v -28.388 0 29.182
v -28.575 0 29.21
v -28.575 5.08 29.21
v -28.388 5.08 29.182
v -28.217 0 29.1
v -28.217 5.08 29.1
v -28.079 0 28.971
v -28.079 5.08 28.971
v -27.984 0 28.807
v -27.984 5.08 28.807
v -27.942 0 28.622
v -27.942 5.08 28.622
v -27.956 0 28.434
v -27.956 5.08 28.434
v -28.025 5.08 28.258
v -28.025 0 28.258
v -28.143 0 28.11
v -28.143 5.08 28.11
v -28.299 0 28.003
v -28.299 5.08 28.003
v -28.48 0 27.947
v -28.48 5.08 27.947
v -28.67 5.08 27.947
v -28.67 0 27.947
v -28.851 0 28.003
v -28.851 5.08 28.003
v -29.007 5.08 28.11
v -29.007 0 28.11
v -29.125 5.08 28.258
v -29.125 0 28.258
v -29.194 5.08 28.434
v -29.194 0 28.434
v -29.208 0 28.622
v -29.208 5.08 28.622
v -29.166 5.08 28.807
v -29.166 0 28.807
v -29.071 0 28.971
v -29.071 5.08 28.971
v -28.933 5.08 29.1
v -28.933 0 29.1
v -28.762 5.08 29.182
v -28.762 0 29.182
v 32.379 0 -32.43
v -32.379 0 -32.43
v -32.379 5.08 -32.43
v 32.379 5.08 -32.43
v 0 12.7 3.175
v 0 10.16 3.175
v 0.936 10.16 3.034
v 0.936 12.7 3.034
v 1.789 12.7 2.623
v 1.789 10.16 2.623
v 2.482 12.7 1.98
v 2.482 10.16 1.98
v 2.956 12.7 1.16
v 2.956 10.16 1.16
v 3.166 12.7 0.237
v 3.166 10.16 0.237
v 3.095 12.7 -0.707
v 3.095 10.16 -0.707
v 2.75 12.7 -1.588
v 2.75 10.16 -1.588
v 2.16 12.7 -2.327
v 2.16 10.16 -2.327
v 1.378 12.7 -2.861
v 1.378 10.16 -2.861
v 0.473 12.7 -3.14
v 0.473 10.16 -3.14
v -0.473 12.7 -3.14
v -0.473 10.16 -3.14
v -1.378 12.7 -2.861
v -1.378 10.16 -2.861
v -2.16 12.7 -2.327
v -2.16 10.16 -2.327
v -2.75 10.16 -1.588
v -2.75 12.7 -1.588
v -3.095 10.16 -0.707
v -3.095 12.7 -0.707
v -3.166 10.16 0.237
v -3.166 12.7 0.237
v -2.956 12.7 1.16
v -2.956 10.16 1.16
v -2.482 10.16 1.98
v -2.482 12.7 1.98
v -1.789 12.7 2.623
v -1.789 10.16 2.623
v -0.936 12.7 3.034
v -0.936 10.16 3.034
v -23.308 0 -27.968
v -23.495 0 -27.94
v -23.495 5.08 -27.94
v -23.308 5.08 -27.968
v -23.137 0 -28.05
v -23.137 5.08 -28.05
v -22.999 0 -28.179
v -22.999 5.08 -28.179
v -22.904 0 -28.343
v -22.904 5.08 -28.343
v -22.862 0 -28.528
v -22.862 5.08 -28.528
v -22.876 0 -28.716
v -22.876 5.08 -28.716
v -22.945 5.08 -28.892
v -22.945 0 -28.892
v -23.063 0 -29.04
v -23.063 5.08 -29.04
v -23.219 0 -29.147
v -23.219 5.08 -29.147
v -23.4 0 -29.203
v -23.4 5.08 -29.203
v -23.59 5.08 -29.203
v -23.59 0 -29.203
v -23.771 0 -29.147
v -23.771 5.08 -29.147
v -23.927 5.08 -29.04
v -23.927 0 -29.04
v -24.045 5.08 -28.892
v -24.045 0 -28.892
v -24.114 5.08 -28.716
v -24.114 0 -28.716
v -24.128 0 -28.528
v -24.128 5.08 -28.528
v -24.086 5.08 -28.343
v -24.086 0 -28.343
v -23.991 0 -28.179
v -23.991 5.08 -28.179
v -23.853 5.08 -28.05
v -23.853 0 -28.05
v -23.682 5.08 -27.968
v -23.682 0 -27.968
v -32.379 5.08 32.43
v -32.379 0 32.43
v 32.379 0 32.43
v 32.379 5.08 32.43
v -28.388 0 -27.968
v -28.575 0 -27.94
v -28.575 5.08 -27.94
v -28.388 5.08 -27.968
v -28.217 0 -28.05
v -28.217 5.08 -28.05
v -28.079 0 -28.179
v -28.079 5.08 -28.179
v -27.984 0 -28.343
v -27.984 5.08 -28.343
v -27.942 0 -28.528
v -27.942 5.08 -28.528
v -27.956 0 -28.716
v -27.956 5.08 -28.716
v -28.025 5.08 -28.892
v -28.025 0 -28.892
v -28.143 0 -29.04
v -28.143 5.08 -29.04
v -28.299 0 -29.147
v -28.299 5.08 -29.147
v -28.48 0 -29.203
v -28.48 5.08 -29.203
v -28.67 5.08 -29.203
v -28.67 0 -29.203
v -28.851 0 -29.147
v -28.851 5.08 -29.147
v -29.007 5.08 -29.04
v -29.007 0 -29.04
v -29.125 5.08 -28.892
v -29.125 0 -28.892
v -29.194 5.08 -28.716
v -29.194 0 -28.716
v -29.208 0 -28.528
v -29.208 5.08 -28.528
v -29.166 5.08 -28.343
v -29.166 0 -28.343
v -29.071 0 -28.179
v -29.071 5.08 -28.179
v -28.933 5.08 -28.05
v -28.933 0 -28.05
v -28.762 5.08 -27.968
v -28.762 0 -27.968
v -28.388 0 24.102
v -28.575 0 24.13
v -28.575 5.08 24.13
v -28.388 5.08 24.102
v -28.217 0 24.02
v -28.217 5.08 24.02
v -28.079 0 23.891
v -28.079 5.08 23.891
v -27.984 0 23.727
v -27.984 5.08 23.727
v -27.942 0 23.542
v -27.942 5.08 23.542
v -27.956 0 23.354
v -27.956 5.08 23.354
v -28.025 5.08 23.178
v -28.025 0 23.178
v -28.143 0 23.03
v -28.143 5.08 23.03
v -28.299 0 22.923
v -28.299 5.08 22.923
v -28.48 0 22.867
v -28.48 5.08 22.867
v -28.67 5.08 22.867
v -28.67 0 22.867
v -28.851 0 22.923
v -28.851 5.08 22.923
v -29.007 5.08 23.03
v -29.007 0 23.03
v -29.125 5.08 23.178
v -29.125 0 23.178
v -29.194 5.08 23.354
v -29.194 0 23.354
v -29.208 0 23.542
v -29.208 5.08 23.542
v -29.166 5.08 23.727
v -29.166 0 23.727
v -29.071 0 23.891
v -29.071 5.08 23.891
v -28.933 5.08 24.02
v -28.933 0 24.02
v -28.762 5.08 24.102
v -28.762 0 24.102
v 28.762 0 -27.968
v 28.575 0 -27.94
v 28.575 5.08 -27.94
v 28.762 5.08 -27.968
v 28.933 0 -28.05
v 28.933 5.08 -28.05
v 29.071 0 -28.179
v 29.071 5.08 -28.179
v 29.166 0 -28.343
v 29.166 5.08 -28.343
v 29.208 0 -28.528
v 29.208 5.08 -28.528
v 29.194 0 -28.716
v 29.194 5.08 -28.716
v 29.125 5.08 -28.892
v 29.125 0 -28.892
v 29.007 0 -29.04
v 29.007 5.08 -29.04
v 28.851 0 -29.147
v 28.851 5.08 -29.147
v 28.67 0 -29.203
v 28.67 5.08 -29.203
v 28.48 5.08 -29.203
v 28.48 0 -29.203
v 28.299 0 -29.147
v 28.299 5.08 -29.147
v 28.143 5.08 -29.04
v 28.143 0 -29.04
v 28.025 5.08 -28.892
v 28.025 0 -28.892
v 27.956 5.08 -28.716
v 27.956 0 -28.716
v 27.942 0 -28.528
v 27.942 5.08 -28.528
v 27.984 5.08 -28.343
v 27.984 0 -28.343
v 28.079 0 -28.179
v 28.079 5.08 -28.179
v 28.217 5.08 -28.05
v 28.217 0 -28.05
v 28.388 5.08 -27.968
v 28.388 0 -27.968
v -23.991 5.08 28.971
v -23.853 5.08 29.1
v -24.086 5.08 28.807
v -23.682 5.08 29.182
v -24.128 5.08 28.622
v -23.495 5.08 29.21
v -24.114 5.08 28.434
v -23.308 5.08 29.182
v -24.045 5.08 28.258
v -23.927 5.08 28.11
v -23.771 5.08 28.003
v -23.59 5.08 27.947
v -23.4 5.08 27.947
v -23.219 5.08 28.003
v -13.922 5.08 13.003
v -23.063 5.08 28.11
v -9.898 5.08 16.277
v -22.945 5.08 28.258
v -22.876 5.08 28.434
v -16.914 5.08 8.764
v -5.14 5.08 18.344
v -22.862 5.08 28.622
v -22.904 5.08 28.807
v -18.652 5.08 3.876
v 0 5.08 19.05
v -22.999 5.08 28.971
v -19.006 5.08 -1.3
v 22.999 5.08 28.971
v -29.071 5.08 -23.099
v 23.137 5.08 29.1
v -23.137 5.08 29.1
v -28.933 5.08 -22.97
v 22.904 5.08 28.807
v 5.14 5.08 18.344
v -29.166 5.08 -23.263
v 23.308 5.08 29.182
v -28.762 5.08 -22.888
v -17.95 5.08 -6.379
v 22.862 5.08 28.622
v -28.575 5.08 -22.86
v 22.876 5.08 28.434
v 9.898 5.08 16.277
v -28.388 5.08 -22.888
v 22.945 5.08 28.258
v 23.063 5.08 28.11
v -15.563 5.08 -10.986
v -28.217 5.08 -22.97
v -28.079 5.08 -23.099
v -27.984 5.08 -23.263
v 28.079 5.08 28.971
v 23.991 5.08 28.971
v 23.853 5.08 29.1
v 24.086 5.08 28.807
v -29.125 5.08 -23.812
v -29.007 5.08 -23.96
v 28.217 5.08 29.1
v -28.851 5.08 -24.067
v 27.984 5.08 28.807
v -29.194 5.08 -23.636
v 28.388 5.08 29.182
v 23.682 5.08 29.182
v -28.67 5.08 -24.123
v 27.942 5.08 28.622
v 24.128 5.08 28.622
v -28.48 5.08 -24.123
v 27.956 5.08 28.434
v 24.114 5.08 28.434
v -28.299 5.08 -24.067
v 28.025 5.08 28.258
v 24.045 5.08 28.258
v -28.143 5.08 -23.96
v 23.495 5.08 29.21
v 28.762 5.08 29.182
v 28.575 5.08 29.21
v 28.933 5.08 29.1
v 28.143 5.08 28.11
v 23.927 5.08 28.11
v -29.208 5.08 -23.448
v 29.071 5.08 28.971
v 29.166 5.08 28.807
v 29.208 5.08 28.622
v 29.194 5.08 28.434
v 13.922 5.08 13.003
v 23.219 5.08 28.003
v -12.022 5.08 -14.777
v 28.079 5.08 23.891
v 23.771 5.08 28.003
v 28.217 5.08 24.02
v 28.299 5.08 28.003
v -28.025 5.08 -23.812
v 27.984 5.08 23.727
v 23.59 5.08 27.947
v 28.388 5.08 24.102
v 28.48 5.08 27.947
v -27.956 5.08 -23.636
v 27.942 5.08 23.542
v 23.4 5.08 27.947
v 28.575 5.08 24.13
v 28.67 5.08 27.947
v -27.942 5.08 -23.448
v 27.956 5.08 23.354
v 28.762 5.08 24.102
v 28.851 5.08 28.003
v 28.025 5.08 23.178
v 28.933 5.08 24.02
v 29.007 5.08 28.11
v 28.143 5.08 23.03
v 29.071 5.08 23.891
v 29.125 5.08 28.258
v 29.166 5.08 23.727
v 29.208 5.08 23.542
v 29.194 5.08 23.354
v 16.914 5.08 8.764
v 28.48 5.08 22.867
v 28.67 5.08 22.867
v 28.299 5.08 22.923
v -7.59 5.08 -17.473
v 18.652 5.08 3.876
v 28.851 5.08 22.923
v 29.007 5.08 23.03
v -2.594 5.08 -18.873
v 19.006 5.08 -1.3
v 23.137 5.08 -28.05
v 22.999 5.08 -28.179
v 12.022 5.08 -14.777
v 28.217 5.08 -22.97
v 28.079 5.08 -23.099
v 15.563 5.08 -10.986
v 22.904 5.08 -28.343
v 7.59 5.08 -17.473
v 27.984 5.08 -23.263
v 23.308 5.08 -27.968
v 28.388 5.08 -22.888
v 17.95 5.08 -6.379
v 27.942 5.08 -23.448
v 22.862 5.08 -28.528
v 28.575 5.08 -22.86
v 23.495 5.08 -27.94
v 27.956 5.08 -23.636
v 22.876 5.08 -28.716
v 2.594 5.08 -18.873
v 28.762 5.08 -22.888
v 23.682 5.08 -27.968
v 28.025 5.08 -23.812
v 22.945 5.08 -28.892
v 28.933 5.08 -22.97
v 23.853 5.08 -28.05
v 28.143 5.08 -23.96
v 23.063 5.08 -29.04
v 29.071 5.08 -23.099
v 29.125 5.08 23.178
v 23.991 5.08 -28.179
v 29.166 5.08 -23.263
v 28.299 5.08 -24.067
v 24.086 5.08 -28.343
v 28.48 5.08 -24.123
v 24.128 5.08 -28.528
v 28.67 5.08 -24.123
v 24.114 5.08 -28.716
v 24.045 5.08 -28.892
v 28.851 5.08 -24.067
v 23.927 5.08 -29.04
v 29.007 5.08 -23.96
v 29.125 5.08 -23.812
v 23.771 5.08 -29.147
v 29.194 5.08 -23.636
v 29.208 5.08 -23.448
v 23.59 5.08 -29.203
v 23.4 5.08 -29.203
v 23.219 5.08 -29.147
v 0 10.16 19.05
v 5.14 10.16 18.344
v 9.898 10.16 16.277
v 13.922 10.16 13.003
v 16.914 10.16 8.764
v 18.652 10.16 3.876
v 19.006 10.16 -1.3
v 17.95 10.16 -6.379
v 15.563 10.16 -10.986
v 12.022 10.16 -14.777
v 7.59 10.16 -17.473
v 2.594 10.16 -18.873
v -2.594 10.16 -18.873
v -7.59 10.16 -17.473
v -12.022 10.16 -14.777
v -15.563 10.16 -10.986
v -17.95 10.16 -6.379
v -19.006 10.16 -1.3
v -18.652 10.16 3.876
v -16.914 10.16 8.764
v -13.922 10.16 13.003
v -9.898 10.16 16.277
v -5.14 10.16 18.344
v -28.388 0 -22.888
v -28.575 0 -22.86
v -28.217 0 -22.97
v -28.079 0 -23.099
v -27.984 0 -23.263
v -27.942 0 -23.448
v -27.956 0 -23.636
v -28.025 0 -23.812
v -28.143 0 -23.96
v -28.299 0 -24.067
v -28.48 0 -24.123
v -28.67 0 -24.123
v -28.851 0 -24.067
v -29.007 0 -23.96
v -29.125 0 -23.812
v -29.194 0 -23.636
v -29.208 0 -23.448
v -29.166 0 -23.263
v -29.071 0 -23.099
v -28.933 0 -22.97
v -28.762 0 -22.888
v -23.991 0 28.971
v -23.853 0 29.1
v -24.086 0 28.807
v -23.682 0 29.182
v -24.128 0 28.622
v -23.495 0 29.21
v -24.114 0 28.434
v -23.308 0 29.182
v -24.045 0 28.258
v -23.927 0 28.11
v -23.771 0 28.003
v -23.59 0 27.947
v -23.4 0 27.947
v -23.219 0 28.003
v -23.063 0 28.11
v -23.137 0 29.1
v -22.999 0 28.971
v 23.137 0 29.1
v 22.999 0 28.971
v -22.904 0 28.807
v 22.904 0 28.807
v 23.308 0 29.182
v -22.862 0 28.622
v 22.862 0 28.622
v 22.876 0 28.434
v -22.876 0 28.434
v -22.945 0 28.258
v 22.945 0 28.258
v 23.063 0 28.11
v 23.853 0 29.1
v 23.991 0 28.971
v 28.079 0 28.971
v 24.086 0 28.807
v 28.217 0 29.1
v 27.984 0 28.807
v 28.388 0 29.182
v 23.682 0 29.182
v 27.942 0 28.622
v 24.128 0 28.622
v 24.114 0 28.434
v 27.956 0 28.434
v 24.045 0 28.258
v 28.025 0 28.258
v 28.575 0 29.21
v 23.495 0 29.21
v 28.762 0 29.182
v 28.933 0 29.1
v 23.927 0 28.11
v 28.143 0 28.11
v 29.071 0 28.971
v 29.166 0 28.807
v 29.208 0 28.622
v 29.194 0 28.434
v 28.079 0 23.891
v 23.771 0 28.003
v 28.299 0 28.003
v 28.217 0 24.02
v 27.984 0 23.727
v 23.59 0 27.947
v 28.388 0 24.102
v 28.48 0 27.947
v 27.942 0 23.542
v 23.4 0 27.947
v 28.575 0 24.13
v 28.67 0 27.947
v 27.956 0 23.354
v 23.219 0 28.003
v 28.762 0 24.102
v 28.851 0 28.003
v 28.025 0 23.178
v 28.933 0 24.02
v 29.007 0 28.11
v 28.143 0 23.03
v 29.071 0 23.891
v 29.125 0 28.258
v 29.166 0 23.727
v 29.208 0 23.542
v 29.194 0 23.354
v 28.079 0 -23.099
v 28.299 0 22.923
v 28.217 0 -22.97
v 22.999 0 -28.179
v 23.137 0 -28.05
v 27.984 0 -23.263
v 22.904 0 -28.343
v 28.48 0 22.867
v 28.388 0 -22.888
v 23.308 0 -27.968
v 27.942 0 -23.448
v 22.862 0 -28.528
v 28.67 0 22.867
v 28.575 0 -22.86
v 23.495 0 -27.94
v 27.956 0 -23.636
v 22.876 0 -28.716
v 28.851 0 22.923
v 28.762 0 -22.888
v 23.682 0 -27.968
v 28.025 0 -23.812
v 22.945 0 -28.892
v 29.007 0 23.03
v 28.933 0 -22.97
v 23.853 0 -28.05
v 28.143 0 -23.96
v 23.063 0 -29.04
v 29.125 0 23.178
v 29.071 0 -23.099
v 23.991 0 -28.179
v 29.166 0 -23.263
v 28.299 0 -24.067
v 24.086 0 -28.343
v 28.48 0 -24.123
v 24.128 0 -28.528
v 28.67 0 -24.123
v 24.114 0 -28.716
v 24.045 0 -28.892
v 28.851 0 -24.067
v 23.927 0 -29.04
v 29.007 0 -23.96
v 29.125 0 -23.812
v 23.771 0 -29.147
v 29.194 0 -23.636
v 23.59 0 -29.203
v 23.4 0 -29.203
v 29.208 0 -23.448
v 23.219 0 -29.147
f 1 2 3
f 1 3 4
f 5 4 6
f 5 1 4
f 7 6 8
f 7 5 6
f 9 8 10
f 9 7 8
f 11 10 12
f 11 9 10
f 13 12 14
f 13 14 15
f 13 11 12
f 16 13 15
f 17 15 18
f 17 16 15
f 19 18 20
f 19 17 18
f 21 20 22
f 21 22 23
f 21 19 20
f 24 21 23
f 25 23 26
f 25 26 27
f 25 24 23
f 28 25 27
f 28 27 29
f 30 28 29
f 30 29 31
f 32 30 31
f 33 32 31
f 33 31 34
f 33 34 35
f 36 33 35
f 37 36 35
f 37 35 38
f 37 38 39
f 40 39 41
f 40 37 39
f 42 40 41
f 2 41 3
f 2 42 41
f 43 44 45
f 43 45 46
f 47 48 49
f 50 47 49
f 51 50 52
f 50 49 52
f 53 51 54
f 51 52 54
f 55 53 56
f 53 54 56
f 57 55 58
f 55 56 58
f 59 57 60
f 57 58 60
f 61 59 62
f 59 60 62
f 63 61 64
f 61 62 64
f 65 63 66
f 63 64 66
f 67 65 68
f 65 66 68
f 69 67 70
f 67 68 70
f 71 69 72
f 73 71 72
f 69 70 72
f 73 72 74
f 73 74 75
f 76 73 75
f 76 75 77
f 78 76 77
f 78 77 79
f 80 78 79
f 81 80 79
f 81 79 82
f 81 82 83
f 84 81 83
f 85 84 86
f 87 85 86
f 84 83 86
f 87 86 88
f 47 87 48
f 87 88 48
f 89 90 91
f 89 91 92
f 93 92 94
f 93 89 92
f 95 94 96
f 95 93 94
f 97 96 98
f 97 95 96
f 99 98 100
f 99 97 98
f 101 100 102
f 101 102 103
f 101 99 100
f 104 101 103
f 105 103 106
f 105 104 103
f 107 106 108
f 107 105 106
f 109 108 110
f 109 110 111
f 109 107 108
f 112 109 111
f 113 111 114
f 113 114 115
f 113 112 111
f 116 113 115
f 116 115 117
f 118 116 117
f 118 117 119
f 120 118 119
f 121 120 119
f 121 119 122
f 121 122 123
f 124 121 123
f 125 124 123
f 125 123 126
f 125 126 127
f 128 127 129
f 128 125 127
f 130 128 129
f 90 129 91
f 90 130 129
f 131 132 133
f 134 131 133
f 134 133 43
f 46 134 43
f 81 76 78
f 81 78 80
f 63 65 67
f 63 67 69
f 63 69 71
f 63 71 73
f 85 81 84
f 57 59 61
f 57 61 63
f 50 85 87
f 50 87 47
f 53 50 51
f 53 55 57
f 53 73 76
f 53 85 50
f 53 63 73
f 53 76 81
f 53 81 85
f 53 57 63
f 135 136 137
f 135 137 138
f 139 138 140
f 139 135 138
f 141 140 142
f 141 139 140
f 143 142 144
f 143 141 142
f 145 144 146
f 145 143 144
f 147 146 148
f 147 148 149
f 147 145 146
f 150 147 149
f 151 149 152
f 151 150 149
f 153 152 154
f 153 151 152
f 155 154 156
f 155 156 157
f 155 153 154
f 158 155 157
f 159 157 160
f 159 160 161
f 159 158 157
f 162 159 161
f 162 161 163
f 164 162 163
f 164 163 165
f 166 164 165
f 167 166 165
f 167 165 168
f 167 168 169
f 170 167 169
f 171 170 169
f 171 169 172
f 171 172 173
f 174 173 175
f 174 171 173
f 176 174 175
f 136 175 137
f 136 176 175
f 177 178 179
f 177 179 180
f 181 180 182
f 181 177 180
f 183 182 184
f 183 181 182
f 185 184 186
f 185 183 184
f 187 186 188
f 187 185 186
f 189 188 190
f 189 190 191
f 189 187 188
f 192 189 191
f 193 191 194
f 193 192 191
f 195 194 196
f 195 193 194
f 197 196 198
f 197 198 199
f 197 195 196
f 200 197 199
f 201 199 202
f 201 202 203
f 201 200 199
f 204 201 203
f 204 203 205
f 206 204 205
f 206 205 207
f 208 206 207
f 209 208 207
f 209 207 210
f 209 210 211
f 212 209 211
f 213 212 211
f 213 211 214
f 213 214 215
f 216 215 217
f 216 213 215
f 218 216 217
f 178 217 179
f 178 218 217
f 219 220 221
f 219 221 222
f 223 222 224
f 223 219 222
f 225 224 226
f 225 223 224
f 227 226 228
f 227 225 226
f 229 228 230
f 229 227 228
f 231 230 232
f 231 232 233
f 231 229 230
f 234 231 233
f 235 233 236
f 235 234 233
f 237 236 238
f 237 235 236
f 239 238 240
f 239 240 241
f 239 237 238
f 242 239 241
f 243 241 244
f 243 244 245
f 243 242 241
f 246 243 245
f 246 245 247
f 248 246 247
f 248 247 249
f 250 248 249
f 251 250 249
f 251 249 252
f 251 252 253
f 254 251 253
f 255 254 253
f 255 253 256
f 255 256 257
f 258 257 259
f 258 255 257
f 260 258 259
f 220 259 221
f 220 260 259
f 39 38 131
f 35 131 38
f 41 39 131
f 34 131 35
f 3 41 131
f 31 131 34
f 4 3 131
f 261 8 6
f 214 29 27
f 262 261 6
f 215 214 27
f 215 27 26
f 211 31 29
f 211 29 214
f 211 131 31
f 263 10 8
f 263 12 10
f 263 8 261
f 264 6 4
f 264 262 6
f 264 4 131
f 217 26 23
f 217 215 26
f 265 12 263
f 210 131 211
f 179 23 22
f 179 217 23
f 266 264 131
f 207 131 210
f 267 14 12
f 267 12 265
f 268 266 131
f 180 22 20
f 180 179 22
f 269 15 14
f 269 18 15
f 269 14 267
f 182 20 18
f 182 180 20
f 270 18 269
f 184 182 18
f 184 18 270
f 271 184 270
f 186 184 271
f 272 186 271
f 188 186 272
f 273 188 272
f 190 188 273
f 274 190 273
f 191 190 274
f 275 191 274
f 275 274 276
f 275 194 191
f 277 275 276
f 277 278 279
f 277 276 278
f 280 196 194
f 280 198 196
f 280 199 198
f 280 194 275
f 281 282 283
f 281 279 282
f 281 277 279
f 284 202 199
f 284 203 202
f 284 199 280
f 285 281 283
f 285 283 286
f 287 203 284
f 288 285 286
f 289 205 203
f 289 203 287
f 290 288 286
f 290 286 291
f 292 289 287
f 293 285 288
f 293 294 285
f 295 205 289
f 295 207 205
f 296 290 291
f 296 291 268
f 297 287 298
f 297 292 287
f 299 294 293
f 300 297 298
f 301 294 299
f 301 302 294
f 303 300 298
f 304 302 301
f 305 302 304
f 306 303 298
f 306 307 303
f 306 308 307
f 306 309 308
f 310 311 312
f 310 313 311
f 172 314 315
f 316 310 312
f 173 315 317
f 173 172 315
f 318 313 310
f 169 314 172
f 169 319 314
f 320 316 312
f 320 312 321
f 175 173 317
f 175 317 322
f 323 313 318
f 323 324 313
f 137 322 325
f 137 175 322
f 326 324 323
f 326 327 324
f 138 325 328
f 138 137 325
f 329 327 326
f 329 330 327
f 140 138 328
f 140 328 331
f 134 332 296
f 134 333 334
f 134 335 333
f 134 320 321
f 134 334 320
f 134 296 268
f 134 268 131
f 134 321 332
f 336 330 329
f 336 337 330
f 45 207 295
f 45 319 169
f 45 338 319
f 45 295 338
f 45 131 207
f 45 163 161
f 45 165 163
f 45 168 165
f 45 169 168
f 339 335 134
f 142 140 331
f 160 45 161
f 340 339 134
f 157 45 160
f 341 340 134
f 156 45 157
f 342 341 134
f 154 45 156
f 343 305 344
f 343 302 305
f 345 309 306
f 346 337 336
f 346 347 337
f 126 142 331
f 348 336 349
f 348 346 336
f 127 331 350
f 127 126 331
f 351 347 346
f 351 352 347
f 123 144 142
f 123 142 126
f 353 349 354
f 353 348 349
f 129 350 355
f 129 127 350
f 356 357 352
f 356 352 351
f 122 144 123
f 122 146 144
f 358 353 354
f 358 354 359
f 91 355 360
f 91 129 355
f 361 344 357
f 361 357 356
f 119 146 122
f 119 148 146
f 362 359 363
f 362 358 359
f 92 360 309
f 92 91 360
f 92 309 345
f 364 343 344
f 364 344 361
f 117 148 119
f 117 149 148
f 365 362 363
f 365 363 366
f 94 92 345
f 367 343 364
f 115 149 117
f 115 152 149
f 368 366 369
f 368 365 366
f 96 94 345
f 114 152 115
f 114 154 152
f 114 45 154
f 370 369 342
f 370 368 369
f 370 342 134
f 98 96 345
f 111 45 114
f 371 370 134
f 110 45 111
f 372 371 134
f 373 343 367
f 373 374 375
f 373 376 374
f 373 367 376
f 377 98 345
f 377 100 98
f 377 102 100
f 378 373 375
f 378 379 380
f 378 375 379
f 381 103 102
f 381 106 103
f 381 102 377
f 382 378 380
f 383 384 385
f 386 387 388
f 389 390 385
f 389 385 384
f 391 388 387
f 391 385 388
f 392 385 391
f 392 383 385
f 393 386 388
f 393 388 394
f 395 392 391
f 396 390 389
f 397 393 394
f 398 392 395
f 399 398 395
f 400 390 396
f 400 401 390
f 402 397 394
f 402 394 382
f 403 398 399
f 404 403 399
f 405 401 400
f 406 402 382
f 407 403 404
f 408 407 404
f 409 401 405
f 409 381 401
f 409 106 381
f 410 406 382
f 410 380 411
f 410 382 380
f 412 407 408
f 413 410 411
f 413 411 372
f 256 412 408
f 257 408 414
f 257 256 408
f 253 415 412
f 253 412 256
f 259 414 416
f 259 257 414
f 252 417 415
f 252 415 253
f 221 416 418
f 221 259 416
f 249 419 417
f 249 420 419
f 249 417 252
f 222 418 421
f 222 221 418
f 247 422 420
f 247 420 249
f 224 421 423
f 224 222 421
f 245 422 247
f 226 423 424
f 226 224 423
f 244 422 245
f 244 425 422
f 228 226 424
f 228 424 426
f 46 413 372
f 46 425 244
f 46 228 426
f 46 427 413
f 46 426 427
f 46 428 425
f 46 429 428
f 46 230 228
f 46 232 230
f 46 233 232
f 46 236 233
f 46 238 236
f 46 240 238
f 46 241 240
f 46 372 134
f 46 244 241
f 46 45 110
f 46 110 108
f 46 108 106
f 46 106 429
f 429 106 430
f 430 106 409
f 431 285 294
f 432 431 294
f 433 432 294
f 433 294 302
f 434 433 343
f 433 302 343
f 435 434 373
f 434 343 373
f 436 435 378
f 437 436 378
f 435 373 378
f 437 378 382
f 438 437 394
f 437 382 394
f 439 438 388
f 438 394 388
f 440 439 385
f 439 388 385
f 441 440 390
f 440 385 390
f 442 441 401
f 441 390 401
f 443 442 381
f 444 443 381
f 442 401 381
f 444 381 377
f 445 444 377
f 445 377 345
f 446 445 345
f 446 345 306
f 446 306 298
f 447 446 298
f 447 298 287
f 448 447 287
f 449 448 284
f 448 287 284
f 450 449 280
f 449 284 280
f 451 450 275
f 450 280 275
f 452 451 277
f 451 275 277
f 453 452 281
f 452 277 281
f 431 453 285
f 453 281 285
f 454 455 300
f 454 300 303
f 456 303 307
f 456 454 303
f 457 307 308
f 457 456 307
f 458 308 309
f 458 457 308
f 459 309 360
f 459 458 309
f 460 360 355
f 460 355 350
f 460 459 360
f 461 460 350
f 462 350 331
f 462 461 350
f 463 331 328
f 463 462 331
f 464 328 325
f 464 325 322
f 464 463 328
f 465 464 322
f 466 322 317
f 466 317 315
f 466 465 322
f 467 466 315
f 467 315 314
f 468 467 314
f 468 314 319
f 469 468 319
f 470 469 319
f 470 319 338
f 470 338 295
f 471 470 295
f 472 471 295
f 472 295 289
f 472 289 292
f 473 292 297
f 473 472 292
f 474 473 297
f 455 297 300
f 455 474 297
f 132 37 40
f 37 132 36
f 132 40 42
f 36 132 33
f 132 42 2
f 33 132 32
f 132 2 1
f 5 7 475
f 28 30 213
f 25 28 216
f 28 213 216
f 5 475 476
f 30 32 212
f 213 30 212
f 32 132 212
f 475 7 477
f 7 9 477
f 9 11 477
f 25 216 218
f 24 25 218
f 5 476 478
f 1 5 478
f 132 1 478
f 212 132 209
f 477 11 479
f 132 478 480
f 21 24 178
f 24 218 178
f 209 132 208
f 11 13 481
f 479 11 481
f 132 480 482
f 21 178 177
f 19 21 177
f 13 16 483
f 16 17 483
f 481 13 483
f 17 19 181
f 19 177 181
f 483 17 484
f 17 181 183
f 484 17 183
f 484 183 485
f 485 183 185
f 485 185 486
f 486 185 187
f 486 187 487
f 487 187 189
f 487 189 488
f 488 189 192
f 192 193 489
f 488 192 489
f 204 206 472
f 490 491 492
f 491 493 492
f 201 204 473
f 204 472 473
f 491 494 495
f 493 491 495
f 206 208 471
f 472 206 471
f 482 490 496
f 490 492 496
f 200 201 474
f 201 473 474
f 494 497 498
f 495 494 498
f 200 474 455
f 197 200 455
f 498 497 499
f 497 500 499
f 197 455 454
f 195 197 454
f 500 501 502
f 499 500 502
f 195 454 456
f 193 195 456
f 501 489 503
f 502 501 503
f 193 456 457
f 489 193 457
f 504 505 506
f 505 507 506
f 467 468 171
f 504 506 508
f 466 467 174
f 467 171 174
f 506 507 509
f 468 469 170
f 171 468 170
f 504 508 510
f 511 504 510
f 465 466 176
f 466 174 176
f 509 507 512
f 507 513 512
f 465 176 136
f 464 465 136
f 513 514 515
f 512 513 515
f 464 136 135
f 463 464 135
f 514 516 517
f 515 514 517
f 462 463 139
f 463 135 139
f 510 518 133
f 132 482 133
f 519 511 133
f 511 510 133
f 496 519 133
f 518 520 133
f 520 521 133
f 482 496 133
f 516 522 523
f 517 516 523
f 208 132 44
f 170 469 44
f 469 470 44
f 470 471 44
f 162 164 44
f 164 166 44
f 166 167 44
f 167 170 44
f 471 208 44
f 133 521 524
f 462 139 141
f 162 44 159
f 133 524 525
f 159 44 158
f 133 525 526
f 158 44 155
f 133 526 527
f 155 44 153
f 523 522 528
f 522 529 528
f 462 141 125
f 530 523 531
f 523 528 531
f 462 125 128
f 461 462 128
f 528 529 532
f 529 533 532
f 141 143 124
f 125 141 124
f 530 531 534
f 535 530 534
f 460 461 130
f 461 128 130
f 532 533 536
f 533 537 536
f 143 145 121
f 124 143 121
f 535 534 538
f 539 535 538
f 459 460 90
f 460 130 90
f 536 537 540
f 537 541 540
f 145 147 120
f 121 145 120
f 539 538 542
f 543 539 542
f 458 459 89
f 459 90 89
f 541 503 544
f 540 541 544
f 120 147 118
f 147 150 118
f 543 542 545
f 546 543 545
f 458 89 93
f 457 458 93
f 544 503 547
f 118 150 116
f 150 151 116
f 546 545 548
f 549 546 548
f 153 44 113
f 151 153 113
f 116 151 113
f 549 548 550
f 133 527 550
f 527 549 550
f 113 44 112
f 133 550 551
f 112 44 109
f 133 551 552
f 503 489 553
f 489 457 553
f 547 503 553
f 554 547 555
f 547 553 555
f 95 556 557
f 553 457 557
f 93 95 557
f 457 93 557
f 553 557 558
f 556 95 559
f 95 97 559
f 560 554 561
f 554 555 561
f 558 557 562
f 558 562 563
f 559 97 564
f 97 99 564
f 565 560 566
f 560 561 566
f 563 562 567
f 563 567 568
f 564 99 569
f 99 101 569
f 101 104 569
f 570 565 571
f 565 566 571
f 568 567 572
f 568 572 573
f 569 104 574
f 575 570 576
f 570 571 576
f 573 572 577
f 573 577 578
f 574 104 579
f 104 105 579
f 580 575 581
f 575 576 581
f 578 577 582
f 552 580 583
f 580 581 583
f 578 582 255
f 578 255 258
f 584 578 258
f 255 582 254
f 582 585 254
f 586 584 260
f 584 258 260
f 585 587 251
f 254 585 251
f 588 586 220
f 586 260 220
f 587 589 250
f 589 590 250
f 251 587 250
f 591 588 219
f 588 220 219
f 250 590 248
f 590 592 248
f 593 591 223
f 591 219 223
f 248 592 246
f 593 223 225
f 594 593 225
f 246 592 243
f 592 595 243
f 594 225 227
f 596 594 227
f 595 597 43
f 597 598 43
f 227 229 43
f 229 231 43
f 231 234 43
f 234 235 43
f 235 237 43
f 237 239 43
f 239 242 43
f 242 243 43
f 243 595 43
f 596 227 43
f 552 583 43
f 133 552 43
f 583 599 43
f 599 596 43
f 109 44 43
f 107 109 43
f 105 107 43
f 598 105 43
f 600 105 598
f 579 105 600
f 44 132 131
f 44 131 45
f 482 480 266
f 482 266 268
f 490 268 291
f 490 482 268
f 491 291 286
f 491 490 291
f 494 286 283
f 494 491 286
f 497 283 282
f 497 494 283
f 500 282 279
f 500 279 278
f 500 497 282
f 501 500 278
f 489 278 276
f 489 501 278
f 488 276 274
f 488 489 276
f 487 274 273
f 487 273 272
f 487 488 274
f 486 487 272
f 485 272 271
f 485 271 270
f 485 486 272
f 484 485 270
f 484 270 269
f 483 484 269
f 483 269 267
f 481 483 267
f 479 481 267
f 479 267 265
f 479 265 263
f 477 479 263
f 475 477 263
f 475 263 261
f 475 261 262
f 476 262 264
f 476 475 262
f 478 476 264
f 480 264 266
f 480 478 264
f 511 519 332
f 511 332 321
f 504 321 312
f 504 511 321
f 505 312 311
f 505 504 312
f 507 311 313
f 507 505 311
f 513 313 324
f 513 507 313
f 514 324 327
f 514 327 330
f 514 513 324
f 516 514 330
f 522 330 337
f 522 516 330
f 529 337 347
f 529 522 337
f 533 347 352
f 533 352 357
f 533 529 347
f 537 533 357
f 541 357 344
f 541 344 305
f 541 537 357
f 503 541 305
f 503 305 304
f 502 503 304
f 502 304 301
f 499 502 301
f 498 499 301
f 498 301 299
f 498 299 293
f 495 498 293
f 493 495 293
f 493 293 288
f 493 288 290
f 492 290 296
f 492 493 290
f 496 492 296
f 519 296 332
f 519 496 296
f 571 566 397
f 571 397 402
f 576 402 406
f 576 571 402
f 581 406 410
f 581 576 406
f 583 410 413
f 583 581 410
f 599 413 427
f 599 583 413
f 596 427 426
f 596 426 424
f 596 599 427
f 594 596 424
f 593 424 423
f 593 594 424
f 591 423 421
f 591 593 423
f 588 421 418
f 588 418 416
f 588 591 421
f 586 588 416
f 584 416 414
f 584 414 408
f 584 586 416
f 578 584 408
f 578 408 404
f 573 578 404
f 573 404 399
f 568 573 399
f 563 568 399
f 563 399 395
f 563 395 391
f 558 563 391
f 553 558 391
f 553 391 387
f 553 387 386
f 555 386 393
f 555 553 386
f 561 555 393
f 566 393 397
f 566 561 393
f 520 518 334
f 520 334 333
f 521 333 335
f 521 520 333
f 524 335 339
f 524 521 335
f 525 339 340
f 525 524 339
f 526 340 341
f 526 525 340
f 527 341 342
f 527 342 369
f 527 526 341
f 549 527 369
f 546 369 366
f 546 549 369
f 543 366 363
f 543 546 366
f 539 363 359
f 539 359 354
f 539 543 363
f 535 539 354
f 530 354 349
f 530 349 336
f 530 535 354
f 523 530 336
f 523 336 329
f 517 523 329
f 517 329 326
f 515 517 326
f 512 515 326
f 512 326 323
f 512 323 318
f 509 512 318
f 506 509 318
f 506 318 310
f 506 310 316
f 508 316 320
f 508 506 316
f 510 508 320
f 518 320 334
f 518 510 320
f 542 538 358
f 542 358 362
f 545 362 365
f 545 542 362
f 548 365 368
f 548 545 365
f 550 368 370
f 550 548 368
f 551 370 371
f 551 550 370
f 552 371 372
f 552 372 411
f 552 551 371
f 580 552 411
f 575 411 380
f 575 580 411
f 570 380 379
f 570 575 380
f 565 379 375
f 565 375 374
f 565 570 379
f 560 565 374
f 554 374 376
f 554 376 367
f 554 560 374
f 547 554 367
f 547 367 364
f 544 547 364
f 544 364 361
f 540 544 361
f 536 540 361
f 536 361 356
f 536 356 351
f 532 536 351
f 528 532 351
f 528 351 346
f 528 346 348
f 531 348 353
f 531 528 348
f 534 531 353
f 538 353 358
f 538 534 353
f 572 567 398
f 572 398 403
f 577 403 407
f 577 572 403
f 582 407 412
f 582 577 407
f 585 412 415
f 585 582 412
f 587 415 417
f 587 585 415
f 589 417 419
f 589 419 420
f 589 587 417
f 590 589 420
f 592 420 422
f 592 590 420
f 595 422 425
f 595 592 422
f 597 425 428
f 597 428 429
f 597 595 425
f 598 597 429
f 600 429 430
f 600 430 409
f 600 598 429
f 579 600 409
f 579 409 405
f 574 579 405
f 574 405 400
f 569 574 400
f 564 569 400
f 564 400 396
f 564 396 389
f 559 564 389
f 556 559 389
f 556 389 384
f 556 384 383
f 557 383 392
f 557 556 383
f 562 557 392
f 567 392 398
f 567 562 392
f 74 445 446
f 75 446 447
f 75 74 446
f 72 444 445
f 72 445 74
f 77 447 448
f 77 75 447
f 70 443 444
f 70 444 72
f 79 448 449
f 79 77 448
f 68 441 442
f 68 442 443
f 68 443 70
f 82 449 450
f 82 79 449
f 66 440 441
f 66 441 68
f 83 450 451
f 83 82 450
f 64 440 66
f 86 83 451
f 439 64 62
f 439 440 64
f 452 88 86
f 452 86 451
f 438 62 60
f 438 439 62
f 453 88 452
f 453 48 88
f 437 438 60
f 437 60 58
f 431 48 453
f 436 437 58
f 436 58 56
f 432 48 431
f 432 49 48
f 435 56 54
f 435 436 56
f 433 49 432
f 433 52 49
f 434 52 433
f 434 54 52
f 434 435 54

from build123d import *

# Parameters (mm, degrees)
SKETCH1_W           = 64.757022316
SKETCH1_H           = 64.860932096
SKETCH1_R           = 0.635
BOSS_EXTRUDE1_DEPTH = 5.08
SKETCH2_R           = 19.05
BOSS_EXTRUDE2_DEPTH = 5.08
SKETCH3_R           = 3.175
BOSS_EXTRUDE3_DEPTH = 2.54


with BuildPart() as part:
    # Sketch1 → Boss-Extrude1 (new body)
    with BuildSketch(Plane(origin=(0, 0, 0), x_dir=(1, 0, 0), z_dir=(0, 1, 0))):
        Rectangle(SKETCH1_W, SKETCH1_H)
        with Locations(Location((-28.575, 28.575, 0), (0, 0, 270))):
            Circle(SKETCH1_R, mode=Mode.SUBTRACT)
        with Locations(Location((-23.495, 28.575, 0), (0, 0, 270))):
            Circle(SKETCH1_R, mode=Mode.SUBTRACT)
        with Locations(Location((-28.575, 23.495, 0), (0, 0, 270))):
            Circle(SKETCH1_R, mode=Mode.SUBTRACT)
        with Locations(Location((28.575, 28.575, 0), (0, 0, 270))):
            Circle(SKETCH1_R, mode=Mode.SUBTRACT)
        with Locations(Location((23.495, 28.575, 0), (0, 0, 270))):
            Circle(SKETCH1_R, mode=Mode.SUBTRACT)
        with Locations(Location((28.575, 23.495, 0), (0, 0, 270))):
            Circle(SKETCH1_R, mode=Mode.SUBTRACT)
        with Locations(Location((28.575, -28.575, 0), (0, 0, 270))):
            Circle(SKETCH1_R, mode=Mode.SUBTRACT)
        with Locations(Location((28.575, -23.495, 0), (0, 0, 270))):
            Circle(SKETCH1_R, mode=Mode.SUBTRACT)
        with Locations(Location((23.495, -28.575, 0), (0, 0, 270))):
            Circle(SKETCH1_R, mode=Mode.SUBTRACT)
        with Locations(Location((-28.575, -28.575, 0), (0, 0, 270))):
            Circle(SKETCH1_R, mode=Mode.SUBTRACT)
        with Locations(Location((-28.575, -23.495, 0), (0, 0, 270))):
            Circle(SKETCH1_R, mode=Mode.SUBTRACT)
        with Locations(Location((-23.495, -28.575, 0), (0, 0, 270))):
            Circle(SKETCH1_R, mode=Mode.SUBTRACT)
    extrude(amount=BOSS_EXTRUDE1_DEPTH)

    # Sketch2 → Boss-Extrude2 (add)
    with BuildSketch(Plane(origin=(0, 5.08, 0), x_dir=(1, 0, 0), z_dir=(0, 1, 0))):
        with Locations(Location((0, 0, 0), (0, 0, 270))):
            Circle(SKETCH2_R)
    extrude(amount=BOSS_EXTRUDE2_DEPTH)

    # Sketch3 → Boss-Extrude3 (add)
    with BuildSketch(Plane(origin=(0, 10.16, 0), x_dir=(1, 0, 0), z_dir=(0, 1, 0))):
        with Locations(Location((0, 0, 0), (0, 0, 270))):
            Circle(SKETCH3_R)
    extrude(amount=BOSS_EXTRUDE3_DEPTH)


solid = part.part
